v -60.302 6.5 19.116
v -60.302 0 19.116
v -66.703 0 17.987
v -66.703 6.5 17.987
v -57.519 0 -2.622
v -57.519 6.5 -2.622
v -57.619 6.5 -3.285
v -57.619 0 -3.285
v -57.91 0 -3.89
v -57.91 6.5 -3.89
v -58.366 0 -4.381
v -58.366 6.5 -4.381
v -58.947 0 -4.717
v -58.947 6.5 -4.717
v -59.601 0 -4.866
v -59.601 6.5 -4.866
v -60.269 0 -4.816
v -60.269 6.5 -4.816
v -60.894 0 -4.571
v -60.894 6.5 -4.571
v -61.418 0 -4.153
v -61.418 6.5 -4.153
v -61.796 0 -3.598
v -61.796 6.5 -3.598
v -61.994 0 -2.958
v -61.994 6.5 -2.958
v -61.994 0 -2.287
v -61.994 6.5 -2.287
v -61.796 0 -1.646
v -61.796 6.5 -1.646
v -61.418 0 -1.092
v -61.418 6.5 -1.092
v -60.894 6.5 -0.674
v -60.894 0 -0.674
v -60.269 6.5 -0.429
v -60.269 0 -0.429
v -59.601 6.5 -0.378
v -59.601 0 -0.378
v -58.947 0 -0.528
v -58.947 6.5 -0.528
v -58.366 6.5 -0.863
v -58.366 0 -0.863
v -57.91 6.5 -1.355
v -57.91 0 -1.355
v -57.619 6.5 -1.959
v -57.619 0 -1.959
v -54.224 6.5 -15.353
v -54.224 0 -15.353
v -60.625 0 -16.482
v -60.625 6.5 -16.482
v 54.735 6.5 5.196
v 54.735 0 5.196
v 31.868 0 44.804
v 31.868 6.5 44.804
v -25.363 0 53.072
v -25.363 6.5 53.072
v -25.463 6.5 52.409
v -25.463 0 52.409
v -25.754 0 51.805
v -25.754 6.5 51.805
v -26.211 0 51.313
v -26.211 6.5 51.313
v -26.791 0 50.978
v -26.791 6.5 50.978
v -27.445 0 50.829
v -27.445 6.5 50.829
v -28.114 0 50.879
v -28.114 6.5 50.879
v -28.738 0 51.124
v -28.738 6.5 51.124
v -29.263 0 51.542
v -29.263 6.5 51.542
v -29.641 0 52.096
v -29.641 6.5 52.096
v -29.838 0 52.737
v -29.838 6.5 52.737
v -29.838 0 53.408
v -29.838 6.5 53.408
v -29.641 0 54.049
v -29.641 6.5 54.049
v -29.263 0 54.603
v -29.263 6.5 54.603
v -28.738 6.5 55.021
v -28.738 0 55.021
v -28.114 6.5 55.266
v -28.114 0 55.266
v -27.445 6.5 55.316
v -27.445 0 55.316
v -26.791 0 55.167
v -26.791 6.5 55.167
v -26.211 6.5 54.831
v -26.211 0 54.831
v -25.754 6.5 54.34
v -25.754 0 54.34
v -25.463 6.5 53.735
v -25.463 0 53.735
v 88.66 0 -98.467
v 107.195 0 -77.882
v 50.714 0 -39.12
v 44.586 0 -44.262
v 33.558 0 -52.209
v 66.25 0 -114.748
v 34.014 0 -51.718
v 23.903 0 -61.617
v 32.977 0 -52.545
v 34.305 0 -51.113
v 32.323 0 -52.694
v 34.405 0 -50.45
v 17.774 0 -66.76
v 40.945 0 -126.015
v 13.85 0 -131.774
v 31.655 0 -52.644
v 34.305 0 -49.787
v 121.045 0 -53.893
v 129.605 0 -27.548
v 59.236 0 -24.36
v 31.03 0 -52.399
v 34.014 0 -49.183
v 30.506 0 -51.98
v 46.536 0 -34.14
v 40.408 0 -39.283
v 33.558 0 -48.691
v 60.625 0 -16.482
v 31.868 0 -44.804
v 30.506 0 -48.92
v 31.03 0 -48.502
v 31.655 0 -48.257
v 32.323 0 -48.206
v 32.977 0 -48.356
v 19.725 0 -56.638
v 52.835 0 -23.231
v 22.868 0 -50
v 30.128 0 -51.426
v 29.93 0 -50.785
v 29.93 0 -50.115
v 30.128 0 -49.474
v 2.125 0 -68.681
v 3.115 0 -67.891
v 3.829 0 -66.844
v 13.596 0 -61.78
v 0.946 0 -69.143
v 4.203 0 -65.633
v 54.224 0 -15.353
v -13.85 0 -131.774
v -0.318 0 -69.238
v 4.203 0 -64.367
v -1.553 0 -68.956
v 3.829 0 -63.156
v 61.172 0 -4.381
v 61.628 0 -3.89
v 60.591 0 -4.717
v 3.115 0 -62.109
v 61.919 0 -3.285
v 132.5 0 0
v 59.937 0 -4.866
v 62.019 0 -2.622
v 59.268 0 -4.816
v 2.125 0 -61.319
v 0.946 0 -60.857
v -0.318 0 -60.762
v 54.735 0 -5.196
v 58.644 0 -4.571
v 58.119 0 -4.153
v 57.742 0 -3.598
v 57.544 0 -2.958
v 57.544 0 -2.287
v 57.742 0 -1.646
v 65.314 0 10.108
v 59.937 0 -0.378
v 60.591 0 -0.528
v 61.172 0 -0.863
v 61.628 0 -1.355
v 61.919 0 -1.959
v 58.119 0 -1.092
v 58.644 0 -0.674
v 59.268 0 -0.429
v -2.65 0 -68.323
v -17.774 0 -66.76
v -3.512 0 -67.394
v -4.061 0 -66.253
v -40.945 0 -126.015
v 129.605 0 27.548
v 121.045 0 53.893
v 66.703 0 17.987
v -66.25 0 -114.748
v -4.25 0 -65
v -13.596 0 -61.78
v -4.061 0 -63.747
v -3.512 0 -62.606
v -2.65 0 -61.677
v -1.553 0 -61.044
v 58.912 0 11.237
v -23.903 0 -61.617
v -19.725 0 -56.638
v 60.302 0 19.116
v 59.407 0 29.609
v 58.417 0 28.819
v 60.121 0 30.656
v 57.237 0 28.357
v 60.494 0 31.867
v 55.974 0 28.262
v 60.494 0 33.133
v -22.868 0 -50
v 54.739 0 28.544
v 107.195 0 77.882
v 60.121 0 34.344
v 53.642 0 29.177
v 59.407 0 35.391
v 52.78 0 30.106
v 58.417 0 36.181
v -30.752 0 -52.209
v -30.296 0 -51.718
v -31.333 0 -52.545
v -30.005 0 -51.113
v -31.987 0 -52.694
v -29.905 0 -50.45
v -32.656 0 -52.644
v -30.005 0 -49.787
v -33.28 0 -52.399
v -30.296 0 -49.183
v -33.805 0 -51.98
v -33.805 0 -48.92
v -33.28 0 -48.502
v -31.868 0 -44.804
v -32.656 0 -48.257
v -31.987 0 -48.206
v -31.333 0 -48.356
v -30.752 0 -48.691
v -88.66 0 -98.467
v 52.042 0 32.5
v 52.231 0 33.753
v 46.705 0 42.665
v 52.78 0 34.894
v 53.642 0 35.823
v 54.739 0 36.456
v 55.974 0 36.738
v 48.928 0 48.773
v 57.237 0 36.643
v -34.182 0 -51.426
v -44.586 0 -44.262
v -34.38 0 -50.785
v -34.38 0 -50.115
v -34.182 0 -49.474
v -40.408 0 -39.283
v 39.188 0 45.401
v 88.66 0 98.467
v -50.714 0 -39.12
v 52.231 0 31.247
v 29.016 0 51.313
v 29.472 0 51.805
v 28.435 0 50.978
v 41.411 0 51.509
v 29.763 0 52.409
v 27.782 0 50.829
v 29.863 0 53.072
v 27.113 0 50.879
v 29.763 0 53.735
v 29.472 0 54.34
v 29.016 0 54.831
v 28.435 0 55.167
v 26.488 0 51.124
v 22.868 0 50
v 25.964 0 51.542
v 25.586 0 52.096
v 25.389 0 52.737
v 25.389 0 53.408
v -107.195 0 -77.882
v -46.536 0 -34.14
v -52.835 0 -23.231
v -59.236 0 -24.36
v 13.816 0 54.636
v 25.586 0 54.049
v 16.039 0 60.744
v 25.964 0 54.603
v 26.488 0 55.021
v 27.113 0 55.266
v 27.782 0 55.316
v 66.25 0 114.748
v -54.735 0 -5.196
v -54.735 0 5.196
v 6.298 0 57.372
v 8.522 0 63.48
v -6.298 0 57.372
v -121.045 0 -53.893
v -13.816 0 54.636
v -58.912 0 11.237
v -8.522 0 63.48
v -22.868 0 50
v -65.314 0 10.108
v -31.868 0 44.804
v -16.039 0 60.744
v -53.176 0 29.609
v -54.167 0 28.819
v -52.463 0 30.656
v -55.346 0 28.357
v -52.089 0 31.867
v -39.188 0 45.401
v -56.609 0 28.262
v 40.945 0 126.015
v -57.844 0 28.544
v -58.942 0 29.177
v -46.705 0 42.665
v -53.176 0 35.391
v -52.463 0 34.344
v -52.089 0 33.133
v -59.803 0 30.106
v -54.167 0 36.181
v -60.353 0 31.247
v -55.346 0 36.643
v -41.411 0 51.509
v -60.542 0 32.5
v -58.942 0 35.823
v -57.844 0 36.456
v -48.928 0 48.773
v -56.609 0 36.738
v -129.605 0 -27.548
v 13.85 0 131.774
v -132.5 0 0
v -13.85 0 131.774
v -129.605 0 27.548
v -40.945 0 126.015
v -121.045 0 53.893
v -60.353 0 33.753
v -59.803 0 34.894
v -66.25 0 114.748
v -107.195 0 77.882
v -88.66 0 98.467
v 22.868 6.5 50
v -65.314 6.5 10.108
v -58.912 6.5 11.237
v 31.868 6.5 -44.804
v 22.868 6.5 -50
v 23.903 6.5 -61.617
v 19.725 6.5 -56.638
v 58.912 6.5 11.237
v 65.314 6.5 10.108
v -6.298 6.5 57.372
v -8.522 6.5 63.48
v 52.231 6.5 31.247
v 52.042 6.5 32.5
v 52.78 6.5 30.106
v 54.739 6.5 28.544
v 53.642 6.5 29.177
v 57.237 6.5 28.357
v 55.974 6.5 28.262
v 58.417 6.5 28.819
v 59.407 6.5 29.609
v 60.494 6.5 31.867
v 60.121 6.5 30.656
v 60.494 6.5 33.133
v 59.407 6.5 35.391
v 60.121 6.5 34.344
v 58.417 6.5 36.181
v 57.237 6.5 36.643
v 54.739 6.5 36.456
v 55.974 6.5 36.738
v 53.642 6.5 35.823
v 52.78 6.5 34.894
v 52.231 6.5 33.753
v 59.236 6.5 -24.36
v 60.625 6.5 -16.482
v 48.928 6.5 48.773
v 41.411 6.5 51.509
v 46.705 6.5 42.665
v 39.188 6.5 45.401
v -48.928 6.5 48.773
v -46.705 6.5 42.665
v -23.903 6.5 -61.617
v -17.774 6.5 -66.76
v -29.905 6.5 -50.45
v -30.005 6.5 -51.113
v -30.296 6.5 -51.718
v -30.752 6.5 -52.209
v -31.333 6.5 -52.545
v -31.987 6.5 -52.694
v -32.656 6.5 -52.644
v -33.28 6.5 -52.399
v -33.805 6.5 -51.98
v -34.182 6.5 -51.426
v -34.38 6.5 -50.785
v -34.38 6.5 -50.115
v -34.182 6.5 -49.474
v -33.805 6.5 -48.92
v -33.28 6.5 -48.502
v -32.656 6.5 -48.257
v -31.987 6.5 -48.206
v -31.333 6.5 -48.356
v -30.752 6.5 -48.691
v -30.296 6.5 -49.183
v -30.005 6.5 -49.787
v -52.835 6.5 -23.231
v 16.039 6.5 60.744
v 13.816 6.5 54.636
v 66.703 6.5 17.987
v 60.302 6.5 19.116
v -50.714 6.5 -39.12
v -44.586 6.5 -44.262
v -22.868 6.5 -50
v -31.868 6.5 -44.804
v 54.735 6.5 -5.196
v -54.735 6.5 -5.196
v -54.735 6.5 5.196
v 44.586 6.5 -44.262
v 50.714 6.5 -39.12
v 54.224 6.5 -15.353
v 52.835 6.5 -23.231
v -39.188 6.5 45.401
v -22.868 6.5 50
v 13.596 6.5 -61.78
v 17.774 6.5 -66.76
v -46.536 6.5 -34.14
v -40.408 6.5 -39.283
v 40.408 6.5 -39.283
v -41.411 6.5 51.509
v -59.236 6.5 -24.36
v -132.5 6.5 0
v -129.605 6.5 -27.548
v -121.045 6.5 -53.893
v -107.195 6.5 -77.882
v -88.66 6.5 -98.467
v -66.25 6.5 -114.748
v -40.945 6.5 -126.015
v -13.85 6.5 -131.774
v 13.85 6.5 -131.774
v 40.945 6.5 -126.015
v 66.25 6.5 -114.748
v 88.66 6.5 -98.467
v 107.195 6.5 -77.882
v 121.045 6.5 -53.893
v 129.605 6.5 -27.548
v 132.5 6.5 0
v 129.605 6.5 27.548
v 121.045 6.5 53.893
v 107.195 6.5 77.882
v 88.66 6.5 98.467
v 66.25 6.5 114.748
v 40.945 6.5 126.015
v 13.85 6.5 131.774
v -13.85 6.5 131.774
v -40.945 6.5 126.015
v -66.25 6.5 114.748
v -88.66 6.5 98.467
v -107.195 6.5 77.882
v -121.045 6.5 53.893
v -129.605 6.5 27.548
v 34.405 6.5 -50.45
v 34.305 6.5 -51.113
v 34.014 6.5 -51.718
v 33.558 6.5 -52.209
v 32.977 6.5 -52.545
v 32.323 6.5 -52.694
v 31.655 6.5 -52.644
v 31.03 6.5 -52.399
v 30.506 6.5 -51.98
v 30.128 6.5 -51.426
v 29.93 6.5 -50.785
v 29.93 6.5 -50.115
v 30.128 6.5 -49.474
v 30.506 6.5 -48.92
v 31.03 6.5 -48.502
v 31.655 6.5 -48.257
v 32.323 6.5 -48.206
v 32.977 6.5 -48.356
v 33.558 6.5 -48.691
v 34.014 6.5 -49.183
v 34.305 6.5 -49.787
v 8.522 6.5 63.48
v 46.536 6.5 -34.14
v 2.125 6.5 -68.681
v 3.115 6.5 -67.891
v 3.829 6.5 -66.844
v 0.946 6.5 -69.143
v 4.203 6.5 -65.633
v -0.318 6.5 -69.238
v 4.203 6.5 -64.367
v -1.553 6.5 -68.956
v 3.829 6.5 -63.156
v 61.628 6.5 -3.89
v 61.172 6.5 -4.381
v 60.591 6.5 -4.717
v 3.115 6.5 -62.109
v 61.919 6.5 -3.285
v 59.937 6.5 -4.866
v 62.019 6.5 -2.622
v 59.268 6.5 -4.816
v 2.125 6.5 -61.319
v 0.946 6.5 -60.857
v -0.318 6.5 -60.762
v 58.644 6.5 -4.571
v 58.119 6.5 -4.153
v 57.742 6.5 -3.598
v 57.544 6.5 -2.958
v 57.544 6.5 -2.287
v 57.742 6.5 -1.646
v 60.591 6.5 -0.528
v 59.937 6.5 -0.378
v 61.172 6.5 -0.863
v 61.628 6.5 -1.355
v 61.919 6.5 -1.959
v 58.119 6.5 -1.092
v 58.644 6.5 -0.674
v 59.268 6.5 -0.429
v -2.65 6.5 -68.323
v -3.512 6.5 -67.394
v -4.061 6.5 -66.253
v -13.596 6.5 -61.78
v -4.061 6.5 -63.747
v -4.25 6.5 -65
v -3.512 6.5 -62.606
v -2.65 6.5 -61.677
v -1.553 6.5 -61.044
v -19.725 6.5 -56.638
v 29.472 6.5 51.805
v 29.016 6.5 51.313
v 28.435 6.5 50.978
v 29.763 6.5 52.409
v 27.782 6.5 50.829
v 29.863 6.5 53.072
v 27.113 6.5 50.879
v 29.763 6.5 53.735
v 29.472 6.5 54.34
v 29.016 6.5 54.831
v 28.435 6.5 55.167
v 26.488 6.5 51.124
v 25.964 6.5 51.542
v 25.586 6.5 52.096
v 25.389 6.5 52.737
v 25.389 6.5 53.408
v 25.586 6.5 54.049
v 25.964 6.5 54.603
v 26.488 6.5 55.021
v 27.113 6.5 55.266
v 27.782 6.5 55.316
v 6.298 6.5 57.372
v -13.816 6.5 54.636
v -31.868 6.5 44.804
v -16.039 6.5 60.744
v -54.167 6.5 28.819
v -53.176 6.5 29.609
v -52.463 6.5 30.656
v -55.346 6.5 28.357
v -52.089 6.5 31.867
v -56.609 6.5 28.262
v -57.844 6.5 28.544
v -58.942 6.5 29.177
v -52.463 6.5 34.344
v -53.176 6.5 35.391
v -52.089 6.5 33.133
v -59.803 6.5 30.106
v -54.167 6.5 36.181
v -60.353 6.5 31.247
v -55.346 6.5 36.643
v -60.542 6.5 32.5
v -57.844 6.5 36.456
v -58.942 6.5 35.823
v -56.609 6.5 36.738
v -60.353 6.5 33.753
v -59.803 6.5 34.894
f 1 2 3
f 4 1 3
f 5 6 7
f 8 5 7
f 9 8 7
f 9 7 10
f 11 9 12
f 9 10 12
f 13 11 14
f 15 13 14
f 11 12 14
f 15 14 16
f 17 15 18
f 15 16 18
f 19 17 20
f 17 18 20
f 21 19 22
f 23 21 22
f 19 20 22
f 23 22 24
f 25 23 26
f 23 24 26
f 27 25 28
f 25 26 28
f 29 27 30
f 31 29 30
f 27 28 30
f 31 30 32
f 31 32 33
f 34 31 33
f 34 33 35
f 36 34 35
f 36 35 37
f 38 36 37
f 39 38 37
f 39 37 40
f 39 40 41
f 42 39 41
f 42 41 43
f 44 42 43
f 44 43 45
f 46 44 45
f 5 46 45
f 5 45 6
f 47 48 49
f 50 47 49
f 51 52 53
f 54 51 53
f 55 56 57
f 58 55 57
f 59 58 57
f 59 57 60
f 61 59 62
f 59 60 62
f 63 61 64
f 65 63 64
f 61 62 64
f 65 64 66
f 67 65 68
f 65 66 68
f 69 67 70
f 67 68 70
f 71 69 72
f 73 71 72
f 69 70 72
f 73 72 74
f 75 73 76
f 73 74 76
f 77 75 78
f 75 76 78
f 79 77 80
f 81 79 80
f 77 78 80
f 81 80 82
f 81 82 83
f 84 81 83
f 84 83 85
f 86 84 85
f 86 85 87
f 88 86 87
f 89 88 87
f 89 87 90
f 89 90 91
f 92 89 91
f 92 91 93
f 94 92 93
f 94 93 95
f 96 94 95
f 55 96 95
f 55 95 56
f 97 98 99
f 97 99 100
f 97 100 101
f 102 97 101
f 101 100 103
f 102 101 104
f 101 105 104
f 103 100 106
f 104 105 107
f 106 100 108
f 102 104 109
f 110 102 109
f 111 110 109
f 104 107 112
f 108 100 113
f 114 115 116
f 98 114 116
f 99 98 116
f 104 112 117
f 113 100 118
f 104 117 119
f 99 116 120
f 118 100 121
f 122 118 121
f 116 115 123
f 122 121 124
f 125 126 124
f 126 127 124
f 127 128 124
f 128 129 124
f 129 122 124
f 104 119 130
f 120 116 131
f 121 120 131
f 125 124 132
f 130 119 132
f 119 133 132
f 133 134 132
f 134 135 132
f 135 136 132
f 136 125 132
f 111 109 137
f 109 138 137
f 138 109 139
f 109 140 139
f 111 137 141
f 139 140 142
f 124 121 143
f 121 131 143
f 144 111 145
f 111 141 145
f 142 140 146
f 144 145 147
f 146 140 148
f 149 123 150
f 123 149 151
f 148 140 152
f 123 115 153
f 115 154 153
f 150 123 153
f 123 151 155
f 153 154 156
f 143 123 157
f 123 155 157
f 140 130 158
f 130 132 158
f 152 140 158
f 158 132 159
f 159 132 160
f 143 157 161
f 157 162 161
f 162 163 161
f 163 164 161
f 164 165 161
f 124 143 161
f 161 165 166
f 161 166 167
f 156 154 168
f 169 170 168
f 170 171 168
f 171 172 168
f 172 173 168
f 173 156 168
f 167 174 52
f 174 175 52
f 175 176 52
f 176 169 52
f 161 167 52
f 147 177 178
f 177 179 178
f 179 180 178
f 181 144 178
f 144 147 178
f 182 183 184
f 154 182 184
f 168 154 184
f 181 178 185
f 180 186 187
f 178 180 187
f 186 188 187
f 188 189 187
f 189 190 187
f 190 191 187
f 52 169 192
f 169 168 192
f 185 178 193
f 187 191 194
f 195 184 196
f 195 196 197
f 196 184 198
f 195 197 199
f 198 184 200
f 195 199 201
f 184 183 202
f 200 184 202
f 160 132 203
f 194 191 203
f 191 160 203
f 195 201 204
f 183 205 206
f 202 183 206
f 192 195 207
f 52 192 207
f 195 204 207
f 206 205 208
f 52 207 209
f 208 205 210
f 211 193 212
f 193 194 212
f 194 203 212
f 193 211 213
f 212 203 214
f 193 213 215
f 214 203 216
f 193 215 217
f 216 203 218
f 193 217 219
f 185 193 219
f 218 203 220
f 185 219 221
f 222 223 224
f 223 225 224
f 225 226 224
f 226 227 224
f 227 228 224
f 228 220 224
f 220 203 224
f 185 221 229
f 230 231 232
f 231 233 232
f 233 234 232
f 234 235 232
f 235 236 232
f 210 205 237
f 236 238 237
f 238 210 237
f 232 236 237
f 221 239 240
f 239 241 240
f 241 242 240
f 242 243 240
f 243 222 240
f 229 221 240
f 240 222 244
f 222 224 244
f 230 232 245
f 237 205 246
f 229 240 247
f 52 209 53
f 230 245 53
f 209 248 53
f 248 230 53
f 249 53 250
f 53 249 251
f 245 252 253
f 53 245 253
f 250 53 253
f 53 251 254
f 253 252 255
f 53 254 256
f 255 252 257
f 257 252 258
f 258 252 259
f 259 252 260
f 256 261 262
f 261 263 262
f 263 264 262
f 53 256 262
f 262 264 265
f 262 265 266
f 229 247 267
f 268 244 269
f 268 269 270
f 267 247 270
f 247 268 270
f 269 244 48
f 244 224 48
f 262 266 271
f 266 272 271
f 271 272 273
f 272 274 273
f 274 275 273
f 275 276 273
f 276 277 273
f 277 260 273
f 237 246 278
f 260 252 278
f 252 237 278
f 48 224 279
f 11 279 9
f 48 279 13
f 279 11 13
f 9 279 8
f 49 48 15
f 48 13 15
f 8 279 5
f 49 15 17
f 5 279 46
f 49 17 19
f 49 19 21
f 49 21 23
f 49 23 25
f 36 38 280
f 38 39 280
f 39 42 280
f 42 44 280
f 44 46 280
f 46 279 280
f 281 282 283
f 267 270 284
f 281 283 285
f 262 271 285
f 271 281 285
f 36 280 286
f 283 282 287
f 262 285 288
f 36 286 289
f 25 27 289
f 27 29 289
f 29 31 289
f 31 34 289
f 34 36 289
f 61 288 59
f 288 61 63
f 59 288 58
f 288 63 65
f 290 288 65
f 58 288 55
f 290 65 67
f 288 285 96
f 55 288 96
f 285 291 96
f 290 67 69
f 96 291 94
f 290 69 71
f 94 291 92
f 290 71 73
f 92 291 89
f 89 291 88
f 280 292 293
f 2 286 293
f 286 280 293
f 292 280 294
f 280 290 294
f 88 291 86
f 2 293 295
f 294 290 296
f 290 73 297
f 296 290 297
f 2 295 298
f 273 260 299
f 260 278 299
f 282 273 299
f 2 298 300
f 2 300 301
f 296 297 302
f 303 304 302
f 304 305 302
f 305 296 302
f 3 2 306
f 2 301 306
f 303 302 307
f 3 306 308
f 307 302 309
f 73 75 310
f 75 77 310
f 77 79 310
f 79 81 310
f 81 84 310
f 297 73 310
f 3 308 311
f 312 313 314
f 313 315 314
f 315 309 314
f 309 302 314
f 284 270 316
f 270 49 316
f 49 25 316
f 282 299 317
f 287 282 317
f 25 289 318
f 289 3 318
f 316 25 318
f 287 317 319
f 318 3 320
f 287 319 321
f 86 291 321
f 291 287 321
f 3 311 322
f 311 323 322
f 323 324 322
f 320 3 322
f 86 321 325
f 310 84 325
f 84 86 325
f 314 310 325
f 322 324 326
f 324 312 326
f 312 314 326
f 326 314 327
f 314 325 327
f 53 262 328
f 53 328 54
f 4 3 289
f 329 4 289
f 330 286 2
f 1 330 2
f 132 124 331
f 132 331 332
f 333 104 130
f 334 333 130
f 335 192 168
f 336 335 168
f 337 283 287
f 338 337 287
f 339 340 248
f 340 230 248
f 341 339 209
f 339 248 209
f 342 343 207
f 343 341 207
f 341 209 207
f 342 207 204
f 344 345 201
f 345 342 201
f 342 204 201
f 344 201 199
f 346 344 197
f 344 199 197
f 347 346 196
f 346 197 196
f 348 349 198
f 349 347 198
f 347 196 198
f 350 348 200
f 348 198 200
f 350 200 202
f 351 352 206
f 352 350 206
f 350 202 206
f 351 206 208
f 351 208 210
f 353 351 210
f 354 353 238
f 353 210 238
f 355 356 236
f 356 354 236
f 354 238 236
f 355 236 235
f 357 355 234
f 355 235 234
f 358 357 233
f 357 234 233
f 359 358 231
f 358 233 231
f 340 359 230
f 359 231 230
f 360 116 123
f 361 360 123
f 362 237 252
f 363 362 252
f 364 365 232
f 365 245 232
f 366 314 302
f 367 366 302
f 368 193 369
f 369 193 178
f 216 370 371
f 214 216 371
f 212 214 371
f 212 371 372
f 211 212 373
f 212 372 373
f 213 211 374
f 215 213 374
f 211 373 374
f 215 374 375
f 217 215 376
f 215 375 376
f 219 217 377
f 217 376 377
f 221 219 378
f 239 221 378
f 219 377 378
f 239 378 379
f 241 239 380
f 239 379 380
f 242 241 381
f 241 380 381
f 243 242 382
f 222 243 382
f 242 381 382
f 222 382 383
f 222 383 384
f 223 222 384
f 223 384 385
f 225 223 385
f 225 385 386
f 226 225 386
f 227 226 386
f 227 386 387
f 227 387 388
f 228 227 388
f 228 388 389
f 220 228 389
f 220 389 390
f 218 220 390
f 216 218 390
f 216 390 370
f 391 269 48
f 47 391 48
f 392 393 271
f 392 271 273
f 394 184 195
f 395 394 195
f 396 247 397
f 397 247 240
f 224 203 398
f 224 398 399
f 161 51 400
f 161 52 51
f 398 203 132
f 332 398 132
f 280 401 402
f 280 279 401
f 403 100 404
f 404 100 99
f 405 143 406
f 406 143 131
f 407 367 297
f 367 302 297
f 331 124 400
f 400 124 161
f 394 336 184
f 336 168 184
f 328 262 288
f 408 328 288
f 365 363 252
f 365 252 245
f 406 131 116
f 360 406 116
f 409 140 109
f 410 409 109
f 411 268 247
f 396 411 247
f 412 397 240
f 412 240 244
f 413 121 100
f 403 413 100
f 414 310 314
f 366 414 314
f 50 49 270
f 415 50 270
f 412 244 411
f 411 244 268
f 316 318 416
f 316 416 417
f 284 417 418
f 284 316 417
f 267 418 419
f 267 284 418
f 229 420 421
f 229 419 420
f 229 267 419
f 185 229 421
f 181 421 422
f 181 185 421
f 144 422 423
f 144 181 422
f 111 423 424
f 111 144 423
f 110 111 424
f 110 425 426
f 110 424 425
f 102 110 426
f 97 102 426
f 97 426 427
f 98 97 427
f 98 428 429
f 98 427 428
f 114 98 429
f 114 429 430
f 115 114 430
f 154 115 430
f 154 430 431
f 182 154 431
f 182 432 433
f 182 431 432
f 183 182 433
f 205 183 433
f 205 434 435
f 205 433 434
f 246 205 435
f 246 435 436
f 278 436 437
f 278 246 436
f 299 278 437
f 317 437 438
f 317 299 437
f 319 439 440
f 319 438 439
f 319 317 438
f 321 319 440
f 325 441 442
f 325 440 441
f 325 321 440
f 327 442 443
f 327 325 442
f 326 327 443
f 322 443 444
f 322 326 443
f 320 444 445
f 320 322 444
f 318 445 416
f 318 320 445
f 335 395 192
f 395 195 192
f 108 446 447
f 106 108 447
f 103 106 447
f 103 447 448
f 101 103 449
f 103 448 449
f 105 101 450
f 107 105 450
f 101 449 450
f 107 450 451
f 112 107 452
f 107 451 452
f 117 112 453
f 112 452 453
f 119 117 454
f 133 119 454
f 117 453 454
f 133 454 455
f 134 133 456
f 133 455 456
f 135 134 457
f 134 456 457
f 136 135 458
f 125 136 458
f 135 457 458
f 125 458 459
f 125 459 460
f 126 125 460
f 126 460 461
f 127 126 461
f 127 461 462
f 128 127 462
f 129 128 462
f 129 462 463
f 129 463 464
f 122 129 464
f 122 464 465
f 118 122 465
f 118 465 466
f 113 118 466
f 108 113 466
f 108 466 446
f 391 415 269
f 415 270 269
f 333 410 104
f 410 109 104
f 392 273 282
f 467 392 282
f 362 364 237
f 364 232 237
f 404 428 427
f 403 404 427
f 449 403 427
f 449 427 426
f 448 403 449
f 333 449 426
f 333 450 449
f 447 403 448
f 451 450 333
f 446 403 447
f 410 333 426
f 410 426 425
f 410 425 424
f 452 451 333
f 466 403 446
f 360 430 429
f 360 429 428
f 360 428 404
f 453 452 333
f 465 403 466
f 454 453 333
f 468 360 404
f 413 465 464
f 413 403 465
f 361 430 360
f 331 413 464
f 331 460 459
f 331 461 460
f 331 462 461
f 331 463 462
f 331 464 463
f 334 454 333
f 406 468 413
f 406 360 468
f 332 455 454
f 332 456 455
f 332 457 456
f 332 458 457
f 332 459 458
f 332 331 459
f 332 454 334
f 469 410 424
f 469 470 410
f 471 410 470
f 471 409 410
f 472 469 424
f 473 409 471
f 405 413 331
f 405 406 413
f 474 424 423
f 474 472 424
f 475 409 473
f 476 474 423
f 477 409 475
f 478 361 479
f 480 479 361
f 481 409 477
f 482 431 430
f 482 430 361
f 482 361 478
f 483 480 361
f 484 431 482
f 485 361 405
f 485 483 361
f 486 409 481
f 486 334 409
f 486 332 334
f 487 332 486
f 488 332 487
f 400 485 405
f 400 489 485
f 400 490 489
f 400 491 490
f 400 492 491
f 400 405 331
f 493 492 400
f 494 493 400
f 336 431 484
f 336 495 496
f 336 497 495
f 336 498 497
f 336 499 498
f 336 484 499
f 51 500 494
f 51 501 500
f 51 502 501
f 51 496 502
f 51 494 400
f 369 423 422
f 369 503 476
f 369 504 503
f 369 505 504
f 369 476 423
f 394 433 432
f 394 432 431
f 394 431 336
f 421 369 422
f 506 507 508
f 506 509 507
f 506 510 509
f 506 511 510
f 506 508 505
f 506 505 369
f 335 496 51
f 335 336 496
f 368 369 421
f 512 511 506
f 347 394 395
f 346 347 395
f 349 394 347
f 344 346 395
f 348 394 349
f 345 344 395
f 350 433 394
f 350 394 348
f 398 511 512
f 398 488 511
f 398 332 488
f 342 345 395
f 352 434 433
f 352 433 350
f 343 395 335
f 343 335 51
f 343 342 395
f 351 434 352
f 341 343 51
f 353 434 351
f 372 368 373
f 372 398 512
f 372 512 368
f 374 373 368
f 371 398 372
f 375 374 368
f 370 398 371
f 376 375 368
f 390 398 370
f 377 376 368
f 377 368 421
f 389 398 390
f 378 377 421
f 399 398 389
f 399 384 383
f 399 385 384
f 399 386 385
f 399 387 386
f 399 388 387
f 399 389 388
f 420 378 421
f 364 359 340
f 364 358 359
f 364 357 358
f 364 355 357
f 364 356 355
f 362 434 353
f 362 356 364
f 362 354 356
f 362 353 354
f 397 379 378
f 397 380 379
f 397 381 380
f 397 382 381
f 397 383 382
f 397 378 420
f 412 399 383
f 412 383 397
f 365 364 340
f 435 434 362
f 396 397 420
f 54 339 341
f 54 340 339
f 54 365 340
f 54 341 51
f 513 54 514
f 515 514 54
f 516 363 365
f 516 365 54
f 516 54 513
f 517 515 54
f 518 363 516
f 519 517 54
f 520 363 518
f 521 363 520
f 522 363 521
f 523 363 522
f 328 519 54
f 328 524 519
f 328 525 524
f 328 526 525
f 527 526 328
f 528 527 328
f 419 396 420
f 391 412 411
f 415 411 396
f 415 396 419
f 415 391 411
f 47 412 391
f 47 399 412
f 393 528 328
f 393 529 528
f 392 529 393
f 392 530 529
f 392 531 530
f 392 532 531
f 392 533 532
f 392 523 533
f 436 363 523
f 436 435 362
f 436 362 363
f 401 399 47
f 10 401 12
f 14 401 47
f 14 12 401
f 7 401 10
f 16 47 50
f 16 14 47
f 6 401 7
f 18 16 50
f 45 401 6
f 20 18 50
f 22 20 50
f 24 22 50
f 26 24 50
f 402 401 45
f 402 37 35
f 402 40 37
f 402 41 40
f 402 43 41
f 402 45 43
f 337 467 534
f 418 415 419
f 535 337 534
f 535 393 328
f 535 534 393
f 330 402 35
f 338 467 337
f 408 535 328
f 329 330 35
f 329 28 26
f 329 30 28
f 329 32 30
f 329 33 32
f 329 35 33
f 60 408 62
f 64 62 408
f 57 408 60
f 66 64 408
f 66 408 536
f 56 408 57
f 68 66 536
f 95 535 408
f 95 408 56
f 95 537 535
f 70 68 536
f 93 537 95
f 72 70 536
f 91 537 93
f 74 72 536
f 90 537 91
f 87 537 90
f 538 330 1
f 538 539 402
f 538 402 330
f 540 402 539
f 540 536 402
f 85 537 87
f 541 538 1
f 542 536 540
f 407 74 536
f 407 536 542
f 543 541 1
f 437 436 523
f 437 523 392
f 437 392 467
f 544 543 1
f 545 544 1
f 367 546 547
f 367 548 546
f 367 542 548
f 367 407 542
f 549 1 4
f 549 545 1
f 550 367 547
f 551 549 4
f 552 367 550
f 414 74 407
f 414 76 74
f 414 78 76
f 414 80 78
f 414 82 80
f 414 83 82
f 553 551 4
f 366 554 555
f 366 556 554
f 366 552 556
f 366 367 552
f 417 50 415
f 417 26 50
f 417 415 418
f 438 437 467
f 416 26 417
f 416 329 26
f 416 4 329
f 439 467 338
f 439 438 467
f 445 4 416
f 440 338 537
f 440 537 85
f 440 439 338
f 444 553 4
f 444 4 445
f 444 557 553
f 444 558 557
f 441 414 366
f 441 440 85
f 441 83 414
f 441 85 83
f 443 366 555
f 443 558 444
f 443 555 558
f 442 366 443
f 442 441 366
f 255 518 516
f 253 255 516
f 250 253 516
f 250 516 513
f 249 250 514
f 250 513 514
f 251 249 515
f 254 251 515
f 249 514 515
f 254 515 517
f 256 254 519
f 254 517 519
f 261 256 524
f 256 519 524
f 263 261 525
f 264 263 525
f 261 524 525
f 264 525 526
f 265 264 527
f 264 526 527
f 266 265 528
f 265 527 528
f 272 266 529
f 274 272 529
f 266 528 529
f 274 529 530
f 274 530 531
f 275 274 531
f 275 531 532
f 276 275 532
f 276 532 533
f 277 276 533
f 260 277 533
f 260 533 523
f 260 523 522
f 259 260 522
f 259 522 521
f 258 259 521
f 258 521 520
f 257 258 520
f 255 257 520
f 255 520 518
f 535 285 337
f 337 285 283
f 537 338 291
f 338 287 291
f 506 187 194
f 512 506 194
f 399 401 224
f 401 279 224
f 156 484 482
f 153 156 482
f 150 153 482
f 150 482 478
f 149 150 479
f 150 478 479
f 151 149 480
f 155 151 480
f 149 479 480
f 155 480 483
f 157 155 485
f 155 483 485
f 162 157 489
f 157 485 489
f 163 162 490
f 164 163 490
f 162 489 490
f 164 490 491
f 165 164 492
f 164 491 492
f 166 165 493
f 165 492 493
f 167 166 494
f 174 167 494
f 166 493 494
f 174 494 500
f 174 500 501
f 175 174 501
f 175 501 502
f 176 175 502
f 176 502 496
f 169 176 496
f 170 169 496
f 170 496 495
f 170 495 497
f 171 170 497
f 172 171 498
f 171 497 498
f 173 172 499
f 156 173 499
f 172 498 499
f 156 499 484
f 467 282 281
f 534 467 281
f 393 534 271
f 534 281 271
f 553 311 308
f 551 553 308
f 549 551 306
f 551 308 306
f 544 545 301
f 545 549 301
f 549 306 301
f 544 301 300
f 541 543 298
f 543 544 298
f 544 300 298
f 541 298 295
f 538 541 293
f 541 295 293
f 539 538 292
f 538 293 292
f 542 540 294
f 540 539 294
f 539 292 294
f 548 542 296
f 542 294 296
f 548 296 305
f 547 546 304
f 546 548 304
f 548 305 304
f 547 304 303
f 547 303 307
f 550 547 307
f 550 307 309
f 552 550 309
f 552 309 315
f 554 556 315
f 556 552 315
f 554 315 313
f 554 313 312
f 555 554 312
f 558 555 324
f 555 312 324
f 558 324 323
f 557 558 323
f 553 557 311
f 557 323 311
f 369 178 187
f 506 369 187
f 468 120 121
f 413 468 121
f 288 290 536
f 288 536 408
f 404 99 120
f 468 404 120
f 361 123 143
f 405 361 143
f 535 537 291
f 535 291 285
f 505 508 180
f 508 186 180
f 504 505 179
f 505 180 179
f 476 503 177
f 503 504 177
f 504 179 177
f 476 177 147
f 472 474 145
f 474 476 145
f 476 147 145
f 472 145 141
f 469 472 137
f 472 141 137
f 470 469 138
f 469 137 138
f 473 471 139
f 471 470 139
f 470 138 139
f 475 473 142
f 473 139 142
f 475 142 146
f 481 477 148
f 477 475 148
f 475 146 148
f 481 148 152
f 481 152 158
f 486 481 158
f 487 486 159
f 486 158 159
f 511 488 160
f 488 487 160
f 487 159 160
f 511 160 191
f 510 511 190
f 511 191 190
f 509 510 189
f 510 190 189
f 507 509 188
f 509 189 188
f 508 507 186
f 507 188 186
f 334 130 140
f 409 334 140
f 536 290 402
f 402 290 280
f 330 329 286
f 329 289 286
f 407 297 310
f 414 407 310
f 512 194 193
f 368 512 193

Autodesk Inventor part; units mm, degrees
ref_plane "YZ Plane" through (0, 0, 0) normal (1, 0, 0) x (0, 1, 0)
ref_plane "XZ Plane" through (0, 0, 0) normal (0, 1, 0) x (-1, 0, 0)
ref_plane "XY Plane" through (0, 0, 0) normal (0, 0, 1) x (1, 0, 0)
sketch "Sketch1" plane through (0, 0, 0) normal (0, 1, 0) x (-1, 0, 0)
  circle A0 centre (0, 0) radius 75 construction
  line L0 (67.7446, 23.8956) -> (61.3434, 25.0243) construction
  line L1 (61.3434, 25.0243) -> (51.7927, -29.1401) construction
  line L2 (51.7927, -29.1401) -> (58.194, -30.2688) construction
  line L3 (58.194, -30.2688) -> (67.7446, 23.8956) construction
  line L4 (55.3106, -35.2631) -> (51.1324, -30.2838) construction
  line L5 (51.1324, -30.2838) -> (9, -65.6371) construction
  line L6 (9, -65.6371) -> (13.1781, -70.6164) construction
  line L7 (13.1781, -70.6164) -> (55.3106, -35.2631) construction
  line L8 (-13.1781, -70.6164) -> (-9, -65.6371) construction
  line L9 (-9, -65.6371) -> (-51.1324, -30.2838) construction
  line L10 (-51.1324, -30.2838) -> (-55.3106, -35.2631) construction
  line L11 (-55.3106, -35.2631) -> (-13.1781, -70.6164) construction
  line L12 (-58.194, -30.2688) -> (-51.7927, -29.1401) construction
  line L13 (-51.7927, -29.1401) -> (-61.3434, 25.0243) construction
  line L14 (-61.3434, 25.0243) -> (-67.7446, 23.8956) construction
  line L15 (-67.7446, 23.8956) -> (-58.194, -30.2688) construction
  line L16 (52.3434, 40.6128) -> (54.5665, 46.7208) construction
  line L17 (54.5665, 46.7208) -> (2.8834, 65.5319) construction
  line L18 (2.8834, 65.5319) -> (0.6603, 59.4239) construction
  line L19 (0.6603, 59.4239) -> (52.3434, 40.6128) construction
  line L20 (-0.6603, 59.4239) -> (-2.8834, 65.5319) construction
  line L21 (-2.8834, 65.5319) -> (-54.5665, 46.7208) construction
  line L22 (-54.5665, 46.7208) -> (-52.3434, 40.6128) construction
  line L23 (-52.3434, 40.6128) -> (-0.6603, 59.4239) construction
  line L24 (9, -65.6371) -> (61.3434, 25.0243) construction
  line L25 (52.3434, 40.6128) -> (-52.3434, 40.6128) construction
  line L26 (-61.3434, 25.0243) -> (-9, -65.6371) construction
  arc A1 (67.7446, 23.8956) -> (54.5665, 46.7208) centre (45.8993, 26.5) ccw construction
  arc A2 (-13.1781, -70.6164) -> (13.1781, -70.6164) centre (0, -53) ccw construction
  arc A3 (-54.5665, 46.7208) -> (-67.7446, 23.8956) centre (-45.8993, 26.5) ccw construction
  circle A4 centre (56.2917, 32.5) radius 4.25
  circle A5 centre (0, 0) radius 132.5
  line L27 (-22.8675, 50) -> (22.8675, 50)
  line L28 (31.8675, 44.8038) -> (54.735, 5.1962)
  line L29 (54.735, -5.1962) -> (31.8675, -44.8038)
  line L30 (22.8675, -50) -> (-22.8675, -50)
  line L31 (-31.8675, -44.8038) -> (-54.735, -5.1962)
  line L32 (-54.735, 5.1962) -> (-31.8675, 44.8038)
  line L33 (54.735, -5.1962) -> (54.735, 5.1962)
  line L34 (31.8675, 44.8038) -> (22.8675, 50)
  line L35 (-22.8675, 50) -> (-31.8675, 44.8038)
  line L36 (-54.735, 5.1962) -> (-54.735, -5.1962)
  line L37 (-31.8675, -44.8038) -> (-22.8675, -50)
  line L38 (22.8675, -50) -> (31.8675, -44.8038)
  line L39 (45.8993, 26.5) -> (0, 0) construction
  line L40 (0, 0) -> (0, -53) construction
  line L41 (0, 0) -> (-45.8993, 26.5) construction
  circle A6 centre (0, -65) radius 4.25
  circle A7 centre (-56.2917, 32.5) radius 4.25
  line L42 (-60.3015, 19.1155) -> (-58.9123, 11.237)
  line L43 (-58.9123, 11.237) -> (-65.3136, 10.1083)
  line L44 (-65.3136, 10.1083) -> (-66.7028, 17.9868)
  line L45 (-66.7028, 17.9868) -> (-60.3015, 19.1155)
  line L46 (-19.7246, -56.6381) -> (-13.5963, -61.7804)
  line L47 (-13.5963, -61.7804) -> (-17.7744, -66.7597)
  line L48 (-17.7744, -66.7597) -> (-23.9027, -61.6174)
  line L49 (-23.9027, -61.6174) -> (-19.7246, -56.6381)
  line L50 (50.7143, -39.1198) -> (44.5859, -44.2621)
  line L51 (44.5859, -44.2621) -> (40.4078, -39.2828)
  line L52 (40.4078, -39.2828) -> (46.5362, -34.1405)
  line L53 (46.5362, -34.1405) -> (50.7143, -39.1198)
  line L54 (-46.5362, -34.1405) -> (-40.4078, -39.2828)
  line L55 (-40.4078, -39.2828) -> (-44.5859, -44.2621)
  line L56 (-44.5859, -44.2621) -> (-50.7143, -39.1198)
  line L57 (-50.7143, -39.1198) -> (-46.5362, -34.1405)
  line L58 (-54.2238, -15.3528) -> (-52.8346, -23.2313)
  line L59 (-52.8346, -23.2313) -> (-59.2359, -24.36)
  line L60 (-59.2359, -24.36) -> (-60.6251, -16.4815)
  line L61 (-60.6251, -16.4815) -> (-54.2238, -15.3528)
  line L62 (-16.0391, 60.7436) -> (-8.5216, 63.4798)
  line L63 (-8.5216, 63.4798) -> (-6.2985, 57.3718)
  line L64 (-6.2985, 57.3718) -> (-13.816, 54.6356)
  line L65 (-13.816, 54.6356) -> (-16.0391, 60.7436)
  line L66 (-48.9284, 48.7729) -> (-41.4108, 51.5091)
  line L67 (-41.4108, 51.5091) -> (-39.1877, 45.4011)
  line L68 (-39.1877, 45.4011) -> (-46.7052, 42.6649)
  line L69 (-46.7052, 42.6649) -> (-48.9284, 48.7729)
  line L70 (8.5216, 63.4798) -> (16.0391, 60.7436)
  line L71 (16.0391, 60.7436) -> (13.816, 54.6356)
  line L72 (13.816, 54.6356) -> (6.2985, 57.3718)
  line L73 (6.2985, 57.3718) -> (8.5216, 63.4798)
  line L74 (41.4108, 51.5091) -> (48.9284, 48.7729)
  line L75 (48.9284, 48.7729) -> (46.7052, 42.6649)
  line L76 (46.7052, 42.6649) -> (39.1877, 45.4011)
  line L77 (39.1877, 45.4011) -> (41.4108, 51.5091)
  line L78 (66.7028, 17.9868) -> (65.3136, 10.1083)
  line L79 (65.3136, 10.1083) -> (58.9123, 11.237)
  line L80 (58.9123, 11.237) -> (60.3015, 19.1155)
  line L81 (60.3015, 19.1155) -> (66.7028, 17.9868)
  line L82 (60.6251, -16.4815) -> (59.2359, -24.36)
  line L83 (59.2359, -24.36) -> (52.8346, -23.2313)
  line L84 (52.8346, -23.2313) -> (54.2238, -15.3528)
  line L85 (54.2238, -15.3528) -> (60.6251, -16.4815)
  line L86 (23.9027, -61.6174) -> (17.7744, -66.7597)
  line L87 (17.7744, -66.7597) -> (13.5963, -61.7804)
  line L88 (13.5963, -61.7804) -> (19.7246, -56.6381)
  line L89 (19.7246, -56.6381) -> (23.9027, -61.6174)
  circle A8 centre (56.2917, 32.5) radius 14 construction
  circle A9 centre (-56.2917, 32.5) radius 14 construction
  circle A10 centre (0, -65) radius 14 construction
  point P0 (-28.8675, 50)
  point P1 (28.8675, 50)
  point P2 (57.735, 0)
  point P3 (28.8675, -50)
  point P4 (-28.8675, -50)
  point P5 (-57.735, 0)
  dimension "d0" = 150
  dimension "d8" = 6.5
  dimension "d9" = 18
  dimension "d10" = 18
  dimension "d11" = 18
  dimension "d13" = 60
  dimension "d14" = 20
  dimension "d15" = 20
  dimension "d16" = 20
  dimension "d17" = 20
  dimension "d18" = 20
  dimension "d19" = 20
  dimension "d21" = 60
  dimension "d23" = 22
  dimension "d24" = 8.5
  dimension "d25" = 265
  dimension "d26" = 55
  dimension "d27" = 6
  dimension "d28" = 6
  dimension "d29" = 6
  dimension "d30" = 6
  dimension "d31" = 6
  dimension "d32" = 6
  dimension "d33" = 6
  dimension "d34" = 6
  dimension "d35" = 6
  dimension "d36" = 6
  dimension "d37" = 6
  dimension "d38" = 6
  dimension "d39" = 65
  dimension "d40" = 50
  dimension "d41" = 65
  dimension "d42" = 65
  dimension "d43" = 6.5
  dimension "d44" = 8
  dimension "d45" = 6
  dimension "d46" = 6
  dimension "d47" = 6
  dimension "d48" = 6
  dimension "d49" = 6
  dimension "d50" = 6
  dimension "d51" = 6
  dimension "d52" = 6
  dimension "d53" = 6
  dimension "d54" = 6
  dimension "d55" = 6
  dimension "d56" = 6
  dimension "d62" = 28
extrude "Extrusion1" add sketch "Sketch1" along normal blind 6.5
sketch "Sketch2" plane through (0, 6.5, 0) normal (0, 1, 0) x (1, 0, 0)
  line L0 (-44.5859, 44.2621) -> (-19.7246, 56.6381) construction
  line L1 (-23.9027, 61.6174) -> (-40.4078, 39.2828) construction
  line L2 (23.9027, 61.6174) -> (40.4078, 39.2828) construction
  line L3 (44.5859, 44.2621) -> (19.7246, 56.6381) construction
  line L4 (60.6251, 16.4815) -> (58.9123, -11.237) construction
  line L5 (65.3136, -10.1083) -> (54.2238, 15.3528) construction
  line L6 (41.4108, -51.5091) -> (13.816, -54.6356) construction
  line L7 (16.0391, -60.7436) -> (39.1877, -45.4011) construction
  line L8 (-13.816, -54.6356) -> (-41.4108, -51.5091) construction
  line L9 (-39.1877, -45.4011) -> (-16.0391, -60.7436) construction
  line L10 (-60.6251, 16.4815) -> (-58.9123, -11.237) construction
  line L11 (-65.3136, -10.1083) -> (-54.2238, 15.3528) construction
  circle A0 centre (-59.7687, 2.6222) radius 2.25
  circle A1 centre (-32.1553, 50.4501) radius 2.25
  circle A2 centre (32.1553, 50.4501) radius 2.25
  circle A3 centre (59.7687, 2.6222) radius 2.25
  circle A4 centre (27.6134, -53.0723) radius 2.25
  circle A5 centre (-27.6134, -53.0723) radius 2.25
  dimension "d59" = 4.5
extrude "Extrusion2" cut sketch "Sketch2" against normal through all
equation "\"d15\" = d14"
equation "\"d16\" = d15"
equation "\"d17\" = d15"
equation "\"d18\" = d15"
equation "\"d19\" = d15"
equation "\"d28\" = d27"
equation "\"d29\" = d27"
equation "\"d30\" = d29"
equation "\"d31\" = d27"
equation "\"d32\" = d31"
equation "\"d33\" = d27"
equation "\"d34\" = d33"
equation "\"d35\" = d27"
equation "\"d36\" = d35"
equation "\"d37\" = d27"
equation "\"d38\" = d37"
properties part number "spool_a" material "Plywood, Finish"
